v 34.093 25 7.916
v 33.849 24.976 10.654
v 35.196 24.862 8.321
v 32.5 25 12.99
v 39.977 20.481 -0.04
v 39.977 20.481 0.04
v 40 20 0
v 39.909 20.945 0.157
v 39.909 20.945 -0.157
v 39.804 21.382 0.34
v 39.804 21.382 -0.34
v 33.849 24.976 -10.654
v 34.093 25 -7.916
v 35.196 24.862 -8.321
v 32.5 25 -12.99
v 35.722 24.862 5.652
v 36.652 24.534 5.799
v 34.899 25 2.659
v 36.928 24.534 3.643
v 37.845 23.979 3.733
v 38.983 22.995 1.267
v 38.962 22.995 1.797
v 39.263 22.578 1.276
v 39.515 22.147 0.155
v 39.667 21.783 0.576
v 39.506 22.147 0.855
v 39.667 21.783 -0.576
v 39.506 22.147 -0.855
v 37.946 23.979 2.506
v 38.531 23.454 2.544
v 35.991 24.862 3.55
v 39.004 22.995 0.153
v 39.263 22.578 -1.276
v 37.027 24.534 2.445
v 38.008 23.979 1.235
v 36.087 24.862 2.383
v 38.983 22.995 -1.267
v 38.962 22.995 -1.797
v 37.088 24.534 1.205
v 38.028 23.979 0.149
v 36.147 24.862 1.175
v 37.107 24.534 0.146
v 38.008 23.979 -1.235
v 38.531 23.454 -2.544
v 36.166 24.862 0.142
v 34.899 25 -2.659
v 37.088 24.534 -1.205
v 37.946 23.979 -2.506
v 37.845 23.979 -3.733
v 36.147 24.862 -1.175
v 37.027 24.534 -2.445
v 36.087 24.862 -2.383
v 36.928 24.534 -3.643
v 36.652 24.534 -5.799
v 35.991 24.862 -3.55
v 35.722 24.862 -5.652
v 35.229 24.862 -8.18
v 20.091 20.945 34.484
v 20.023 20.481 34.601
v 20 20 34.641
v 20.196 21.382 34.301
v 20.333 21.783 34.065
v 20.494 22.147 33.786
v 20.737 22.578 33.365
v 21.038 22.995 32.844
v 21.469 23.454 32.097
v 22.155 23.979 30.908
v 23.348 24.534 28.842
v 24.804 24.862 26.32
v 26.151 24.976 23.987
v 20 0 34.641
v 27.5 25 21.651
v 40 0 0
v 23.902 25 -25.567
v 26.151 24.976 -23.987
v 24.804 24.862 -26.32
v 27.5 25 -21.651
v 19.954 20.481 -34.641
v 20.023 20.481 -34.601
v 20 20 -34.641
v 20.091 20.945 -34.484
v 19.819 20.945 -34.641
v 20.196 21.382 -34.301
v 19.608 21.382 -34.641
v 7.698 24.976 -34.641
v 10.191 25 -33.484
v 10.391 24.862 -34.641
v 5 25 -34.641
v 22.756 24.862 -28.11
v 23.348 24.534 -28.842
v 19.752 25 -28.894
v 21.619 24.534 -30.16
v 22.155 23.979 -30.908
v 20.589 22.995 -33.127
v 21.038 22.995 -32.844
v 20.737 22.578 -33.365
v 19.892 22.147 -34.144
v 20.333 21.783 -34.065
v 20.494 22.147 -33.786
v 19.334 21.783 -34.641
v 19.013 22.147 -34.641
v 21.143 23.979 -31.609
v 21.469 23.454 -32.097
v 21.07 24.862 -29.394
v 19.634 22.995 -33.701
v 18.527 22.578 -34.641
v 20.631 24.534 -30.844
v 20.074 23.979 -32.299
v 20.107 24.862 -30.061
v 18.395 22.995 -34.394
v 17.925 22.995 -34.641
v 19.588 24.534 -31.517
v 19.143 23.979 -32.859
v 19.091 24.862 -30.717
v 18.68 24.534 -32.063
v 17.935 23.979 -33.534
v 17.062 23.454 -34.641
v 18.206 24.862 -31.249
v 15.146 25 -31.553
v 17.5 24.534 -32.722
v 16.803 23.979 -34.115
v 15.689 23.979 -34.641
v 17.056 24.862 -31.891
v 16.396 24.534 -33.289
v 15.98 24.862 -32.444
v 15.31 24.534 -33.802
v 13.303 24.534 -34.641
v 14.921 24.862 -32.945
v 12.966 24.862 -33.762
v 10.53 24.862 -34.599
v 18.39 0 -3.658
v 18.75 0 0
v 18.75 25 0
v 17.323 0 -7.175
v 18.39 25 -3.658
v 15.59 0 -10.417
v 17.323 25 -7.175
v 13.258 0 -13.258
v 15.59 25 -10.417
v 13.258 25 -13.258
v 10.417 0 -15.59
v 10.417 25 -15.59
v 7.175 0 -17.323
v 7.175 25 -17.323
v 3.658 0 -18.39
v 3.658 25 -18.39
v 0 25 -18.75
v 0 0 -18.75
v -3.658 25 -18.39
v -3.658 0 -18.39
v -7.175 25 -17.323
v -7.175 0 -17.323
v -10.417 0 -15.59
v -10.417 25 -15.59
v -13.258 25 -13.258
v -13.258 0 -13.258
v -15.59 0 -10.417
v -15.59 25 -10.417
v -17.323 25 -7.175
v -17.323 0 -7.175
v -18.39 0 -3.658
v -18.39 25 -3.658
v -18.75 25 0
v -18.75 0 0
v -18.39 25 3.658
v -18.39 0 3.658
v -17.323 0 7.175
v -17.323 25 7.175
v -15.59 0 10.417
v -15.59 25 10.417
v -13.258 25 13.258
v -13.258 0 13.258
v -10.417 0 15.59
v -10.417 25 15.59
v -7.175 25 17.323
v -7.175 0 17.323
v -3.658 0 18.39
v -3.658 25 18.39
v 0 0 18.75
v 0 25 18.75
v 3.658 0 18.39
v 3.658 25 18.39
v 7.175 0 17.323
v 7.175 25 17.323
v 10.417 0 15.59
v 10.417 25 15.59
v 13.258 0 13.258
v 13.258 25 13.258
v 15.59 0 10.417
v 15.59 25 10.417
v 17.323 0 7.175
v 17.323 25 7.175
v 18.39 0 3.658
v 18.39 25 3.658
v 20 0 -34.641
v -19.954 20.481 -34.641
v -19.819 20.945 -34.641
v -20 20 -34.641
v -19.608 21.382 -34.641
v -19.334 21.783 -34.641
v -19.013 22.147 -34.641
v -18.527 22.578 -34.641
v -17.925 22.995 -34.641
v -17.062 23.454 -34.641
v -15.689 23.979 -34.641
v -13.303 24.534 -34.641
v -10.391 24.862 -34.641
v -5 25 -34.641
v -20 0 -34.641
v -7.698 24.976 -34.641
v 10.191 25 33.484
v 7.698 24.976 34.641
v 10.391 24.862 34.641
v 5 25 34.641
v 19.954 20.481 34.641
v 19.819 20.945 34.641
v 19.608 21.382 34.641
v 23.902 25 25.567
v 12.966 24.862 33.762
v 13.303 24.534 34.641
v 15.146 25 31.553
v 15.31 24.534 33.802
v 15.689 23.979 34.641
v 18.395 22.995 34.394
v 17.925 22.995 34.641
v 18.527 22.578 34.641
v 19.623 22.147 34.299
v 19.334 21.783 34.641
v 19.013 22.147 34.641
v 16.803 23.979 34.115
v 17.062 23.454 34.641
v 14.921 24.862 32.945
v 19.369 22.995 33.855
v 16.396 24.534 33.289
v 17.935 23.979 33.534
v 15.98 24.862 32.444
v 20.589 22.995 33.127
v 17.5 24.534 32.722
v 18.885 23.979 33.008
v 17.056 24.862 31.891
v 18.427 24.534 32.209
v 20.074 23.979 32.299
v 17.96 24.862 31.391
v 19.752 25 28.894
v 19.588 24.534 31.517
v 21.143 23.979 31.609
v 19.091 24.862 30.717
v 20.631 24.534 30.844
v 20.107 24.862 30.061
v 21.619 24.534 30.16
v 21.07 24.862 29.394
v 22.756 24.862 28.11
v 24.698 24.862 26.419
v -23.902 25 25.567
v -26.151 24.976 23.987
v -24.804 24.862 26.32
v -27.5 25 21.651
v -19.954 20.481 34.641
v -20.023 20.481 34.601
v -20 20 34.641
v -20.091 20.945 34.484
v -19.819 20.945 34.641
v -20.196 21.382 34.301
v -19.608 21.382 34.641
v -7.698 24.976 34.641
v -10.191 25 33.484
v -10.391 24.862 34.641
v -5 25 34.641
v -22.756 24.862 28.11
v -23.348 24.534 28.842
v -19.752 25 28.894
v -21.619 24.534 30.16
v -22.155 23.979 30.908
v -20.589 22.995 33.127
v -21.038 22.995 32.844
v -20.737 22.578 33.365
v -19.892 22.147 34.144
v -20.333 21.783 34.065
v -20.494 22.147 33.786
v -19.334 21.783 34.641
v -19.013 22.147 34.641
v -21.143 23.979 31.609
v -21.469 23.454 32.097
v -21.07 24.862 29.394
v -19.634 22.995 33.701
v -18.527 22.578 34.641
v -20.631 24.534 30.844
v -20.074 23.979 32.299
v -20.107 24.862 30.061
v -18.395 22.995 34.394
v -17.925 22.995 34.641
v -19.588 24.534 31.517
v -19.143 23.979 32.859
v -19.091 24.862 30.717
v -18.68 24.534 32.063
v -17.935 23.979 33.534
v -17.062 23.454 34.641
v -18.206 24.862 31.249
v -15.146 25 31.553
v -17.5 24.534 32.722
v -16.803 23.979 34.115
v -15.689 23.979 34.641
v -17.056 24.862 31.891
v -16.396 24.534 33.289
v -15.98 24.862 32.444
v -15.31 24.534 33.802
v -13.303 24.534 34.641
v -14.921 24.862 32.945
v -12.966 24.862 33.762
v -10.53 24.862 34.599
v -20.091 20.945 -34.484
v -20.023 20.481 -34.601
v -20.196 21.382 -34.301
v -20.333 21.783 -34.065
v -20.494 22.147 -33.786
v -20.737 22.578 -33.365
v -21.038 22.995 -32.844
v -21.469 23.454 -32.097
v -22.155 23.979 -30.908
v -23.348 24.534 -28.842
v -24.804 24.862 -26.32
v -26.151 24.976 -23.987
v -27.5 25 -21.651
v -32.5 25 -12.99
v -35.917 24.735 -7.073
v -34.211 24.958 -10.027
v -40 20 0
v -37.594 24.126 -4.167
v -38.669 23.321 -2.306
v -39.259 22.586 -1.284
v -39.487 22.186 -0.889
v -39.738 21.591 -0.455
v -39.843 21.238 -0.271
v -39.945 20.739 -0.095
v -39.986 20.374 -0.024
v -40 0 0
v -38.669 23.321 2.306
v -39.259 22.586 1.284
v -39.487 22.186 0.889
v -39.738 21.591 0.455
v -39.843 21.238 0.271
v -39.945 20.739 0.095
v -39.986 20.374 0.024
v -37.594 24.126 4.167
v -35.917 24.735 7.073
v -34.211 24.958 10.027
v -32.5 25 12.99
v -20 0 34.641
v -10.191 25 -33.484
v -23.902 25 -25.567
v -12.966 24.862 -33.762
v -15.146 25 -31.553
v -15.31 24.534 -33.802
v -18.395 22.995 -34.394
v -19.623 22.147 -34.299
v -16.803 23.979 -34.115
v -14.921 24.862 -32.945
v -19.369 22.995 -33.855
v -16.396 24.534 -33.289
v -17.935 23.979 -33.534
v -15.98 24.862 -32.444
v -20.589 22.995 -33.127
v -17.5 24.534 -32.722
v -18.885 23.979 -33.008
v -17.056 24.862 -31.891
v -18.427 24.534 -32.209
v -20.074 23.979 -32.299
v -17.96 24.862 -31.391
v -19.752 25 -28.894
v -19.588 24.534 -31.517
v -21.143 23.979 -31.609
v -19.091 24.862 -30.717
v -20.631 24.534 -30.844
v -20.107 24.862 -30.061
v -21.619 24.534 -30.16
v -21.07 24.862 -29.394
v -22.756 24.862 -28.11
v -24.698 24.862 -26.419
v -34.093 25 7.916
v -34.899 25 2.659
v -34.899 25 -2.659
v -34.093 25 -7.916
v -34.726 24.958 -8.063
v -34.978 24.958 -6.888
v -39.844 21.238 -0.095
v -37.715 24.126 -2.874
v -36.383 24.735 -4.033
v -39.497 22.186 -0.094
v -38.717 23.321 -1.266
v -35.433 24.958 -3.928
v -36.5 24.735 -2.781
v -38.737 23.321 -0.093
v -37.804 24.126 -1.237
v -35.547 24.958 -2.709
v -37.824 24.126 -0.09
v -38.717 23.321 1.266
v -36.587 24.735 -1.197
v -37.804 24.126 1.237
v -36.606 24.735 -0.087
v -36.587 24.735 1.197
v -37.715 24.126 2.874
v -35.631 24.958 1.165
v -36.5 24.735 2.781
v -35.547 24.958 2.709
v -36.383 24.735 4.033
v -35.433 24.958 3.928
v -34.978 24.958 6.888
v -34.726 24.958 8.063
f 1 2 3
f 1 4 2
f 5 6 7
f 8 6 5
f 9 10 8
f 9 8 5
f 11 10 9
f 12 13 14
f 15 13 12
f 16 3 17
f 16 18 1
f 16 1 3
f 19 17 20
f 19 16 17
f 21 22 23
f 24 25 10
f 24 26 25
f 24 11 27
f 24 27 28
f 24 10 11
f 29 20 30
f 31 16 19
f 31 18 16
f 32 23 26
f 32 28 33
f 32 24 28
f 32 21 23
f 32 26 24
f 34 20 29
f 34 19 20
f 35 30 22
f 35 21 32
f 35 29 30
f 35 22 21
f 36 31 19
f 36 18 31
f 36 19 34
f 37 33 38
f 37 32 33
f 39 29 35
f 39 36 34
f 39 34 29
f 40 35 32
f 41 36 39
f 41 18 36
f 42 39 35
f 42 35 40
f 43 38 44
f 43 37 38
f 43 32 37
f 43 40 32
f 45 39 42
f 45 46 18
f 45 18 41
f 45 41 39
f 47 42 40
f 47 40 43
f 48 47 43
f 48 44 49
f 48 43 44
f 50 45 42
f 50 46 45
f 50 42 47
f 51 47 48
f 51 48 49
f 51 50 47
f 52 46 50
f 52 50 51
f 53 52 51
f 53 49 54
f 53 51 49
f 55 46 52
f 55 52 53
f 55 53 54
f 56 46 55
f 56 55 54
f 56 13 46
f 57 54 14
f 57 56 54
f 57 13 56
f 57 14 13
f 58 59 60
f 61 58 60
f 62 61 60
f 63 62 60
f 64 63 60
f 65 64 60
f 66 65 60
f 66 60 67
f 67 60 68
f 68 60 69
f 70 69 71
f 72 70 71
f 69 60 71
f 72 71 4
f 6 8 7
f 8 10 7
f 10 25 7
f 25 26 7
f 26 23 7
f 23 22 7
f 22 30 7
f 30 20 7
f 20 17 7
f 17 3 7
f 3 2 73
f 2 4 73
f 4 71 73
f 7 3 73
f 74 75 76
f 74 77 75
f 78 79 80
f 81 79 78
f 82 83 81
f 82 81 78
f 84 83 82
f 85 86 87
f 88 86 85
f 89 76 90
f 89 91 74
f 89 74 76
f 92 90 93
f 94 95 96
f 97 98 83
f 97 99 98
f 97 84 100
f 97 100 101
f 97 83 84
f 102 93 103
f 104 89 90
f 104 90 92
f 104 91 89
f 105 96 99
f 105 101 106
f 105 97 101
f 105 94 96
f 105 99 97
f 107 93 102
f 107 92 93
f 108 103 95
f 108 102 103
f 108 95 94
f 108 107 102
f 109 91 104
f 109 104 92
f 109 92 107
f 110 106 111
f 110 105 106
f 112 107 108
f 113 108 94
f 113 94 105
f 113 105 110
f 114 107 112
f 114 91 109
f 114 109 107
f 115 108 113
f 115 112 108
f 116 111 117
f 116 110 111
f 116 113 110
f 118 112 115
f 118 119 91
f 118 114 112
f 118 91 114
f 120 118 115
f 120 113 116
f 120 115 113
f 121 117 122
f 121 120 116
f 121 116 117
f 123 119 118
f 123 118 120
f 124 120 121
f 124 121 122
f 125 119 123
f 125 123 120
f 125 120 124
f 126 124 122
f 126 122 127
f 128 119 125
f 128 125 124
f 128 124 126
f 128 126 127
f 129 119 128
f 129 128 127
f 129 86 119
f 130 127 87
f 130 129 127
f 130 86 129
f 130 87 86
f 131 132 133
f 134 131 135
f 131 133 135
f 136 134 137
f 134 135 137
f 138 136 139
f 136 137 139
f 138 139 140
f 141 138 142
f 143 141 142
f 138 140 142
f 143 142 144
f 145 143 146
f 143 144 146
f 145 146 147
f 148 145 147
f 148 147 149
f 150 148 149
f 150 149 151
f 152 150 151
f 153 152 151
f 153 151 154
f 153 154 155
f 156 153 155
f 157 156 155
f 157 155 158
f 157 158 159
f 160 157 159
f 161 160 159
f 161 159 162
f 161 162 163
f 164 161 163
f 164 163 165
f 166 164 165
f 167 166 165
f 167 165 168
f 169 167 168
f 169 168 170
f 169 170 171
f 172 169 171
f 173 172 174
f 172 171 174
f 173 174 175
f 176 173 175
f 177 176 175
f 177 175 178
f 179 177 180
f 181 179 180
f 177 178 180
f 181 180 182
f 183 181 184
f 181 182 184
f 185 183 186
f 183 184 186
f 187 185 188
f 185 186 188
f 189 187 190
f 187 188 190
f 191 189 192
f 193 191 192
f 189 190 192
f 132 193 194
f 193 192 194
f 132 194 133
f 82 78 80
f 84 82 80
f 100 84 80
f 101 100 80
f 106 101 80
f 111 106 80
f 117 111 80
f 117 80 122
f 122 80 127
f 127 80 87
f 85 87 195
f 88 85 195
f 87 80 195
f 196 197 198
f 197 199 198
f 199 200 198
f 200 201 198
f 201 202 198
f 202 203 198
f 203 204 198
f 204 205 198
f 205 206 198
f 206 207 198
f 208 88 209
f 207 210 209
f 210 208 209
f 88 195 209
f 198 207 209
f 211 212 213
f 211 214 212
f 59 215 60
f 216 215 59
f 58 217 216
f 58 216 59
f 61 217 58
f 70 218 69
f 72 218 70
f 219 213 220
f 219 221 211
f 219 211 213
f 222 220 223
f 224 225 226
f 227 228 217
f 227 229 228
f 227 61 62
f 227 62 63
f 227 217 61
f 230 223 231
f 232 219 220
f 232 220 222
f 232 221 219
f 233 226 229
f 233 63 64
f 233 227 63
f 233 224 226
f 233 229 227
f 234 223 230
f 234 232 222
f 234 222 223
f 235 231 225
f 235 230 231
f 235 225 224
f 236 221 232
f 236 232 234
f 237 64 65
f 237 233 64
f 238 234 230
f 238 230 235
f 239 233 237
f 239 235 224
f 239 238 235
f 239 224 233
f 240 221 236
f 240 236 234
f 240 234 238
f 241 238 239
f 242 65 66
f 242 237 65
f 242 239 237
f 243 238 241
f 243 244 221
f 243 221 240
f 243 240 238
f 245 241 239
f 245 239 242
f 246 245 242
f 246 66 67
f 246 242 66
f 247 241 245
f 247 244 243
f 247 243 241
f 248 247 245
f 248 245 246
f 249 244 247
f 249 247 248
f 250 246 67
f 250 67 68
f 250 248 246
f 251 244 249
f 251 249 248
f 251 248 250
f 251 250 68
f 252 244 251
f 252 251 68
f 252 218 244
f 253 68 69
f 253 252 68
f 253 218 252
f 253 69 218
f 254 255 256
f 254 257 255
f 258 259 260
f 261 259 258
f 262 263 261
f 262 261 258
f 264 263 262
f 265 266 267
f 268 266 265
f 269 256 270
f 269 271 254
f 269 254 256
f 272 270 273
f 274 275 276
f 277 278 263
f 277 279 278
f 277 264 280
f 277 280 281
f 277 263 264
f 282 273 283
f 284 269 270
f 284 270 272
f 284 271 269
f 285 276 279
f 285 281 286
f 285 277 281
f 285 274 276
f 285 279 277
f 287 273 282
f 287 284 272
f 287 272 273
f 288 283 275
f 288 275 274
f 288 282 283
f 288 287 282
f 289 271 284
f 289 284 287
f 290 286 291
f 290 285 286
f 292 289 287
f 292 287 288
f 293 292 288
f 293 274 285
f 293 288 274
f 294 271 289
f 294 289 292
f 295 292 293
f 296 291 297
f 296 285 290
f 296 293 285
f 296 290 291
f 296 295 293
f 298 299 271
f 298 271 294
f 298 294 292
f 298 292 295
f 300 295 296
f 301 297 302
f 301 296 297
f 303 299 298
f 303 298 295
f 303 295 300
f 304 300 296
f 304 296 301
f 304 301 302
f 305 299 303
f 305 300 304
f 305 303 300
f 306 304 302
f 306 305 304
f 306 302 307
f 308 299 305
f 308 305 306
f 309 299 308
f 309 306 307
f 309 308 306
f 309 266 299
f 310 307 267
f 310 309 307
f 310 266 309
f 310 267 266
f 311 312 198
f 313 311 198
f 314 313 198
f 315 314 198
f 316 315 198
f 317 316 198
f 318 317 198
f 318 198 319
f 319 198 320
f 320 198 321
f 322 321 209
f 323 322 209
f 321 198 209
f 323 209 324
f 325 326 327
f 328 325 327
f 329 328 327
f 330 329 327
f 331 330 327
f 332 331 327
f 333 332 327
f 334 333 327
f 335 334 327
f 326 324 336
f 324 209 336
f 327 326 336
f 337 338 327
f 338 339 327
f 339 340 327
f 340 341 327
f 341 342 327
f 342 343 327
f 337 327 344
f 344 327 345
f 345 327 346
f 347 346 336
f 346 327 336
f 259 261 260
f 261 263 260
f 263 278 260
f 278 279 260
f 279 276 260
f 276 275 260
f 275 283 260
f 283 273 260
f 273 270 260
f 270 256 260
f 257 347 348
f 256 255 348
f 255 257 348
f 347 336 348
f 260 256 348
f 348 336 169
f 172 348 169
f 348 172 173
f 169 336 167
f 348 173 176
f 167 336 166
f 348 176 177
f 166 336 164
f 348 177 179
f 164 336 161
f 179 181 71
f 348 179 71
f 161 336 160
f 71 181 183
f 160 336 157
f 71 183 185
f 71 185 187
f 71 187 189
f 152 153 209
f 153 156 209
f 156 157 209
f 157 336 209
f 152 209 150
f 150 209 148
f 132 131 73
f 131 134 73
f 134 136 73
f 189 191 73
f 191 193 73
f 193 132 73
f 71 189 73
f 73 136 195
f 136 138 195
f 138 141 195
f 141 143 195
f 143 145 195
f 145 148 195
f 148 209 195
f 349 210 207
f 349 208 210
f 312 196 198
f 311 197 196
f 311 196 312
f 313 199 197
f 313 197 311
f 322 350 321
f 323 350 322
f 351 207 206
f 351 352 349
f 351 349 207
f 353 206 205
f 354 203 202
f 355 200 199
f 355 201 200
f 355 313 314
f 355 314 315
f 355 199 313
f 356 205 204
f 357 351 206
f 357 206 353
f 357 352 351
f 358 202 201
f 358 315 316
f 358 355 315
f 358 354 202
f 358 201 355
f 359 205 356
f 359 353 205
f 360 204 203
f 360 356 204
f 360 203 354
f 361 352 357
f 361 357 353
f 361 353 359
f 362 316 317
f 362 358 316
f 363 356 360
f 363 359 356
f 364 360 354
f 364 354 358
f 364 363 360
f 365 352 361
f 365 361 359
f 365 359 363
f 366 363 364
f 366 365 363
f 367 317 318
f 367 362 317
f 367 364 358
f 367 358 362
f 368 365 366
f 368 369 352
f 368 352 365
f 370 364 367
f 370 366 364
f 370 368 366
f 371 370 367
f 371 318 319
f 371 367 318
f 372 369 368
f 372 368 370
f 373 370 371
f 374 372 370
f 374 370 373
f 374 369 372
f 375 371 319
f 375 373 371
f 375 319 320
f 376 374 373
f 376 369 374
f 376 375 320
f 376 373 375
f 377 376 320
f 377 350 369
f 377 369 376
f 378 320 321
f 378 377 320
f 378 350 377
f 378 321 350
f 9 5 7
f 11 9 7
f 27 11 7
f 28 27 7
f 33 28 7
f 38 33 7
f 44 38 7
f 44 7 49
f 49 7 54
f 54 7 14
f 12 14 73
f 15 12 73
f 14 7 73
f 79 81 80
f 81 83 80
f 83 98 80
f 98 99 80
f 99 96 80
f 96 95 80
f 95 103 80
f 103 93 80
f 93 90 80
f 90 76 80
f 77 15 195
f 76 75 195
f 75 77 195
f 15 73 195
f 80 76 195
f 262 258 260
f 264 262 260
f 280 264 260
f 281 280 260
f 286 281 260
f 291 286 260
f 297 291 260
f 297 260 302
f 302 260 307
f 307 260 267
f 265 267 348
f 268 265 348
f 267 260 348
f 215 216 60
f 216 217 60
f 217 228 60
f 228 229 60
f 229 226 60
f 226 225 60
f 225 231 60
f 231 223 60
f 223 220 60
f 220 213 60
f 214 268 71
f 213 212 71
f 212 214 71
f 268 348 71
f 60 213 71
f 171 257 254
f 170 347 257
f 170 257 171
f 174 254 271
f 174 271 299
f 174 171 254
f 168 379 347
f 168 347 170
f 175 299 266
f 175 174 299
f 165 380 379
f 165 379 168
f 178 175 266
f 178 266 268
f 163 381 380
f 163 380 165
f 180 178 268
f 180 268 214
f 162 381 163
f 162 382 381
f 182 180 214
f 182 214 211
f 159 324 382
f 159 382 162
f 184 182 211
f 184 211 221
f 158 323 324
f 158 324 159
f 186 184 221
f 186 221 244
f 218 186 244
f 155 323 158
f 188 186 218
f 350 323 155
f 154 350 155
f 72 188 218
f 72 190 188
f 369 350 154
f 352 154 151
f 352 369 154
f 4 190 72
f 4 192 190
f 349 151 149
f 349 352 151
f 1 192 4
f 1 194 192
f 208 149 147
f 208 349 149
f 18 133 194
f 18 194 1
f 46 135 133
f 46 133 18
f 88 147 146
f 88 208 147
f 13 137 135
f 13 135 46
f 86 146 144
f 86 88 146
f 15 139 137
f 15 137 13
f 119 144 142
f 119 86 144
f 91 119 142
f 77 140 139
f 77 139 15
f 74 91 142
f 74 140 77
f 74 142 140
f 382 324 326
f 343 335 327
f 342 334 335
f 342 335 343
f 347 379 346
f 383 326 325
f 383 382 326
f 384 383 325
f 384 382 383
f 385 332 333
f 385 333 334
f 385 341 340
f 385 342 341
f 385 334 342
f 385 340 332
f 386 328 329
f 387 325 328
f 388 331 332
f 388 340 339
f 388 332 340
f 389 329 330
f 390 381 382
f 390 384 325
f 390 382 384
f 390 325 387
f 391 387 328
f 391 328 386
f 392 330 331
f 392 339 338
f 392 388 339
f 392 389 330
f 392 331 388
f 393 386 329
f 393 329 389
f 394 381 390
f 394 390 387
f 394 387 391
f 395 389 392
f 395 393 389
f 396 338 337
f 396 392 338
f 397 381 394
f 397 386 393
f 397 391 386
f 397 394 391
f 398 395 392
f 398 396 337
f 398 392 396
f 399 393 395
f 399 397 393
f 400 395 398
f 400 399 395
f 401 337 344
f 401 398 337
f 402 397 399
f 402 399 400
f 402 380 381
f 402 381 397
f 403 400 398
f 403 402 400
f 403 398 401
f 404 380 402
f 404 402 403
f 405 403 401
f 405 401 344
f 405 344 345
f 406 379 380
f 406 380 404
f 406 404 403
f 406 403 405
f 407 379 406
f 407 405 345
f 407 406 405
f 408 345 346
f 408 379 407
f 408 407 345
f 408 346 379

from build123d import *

# Parameters (mm, degrees)
BOSS_EXTRUDE1_DEPTH = 25
SKETCH3_R           = 18.75
CUT_EXTRUDE1_DEPTH  = 49


with BuildPart() as part:
    # Sketch1 → Boss-Extrude1 (new body)
    with BuildSketch(Plane(origin=(0, 0, 0), x_dir=(1, 0, 0), z_dir=(0, 1, 0))):
        Polygon((40, 0), (20, 34.641016151), (-20, 34.641016151), (-40, 0), (-20, -34.641016151), (20, -34.641016151), align=None)
    extrude(amount=BOSS_EXTRUDE1_DEPTH)

    # Sketch2 → Cut-Revolve1 (revolve, cut)
    with BuildSketch(Plane.XY):
        with BuildLine():
            Line((-40, 19.787670443), (-40, 20))
            ThreePointArc((-40, 20), (-38.535533906, 23.535533906), (-35, 25))
            Line((-35, 25), (-37.757743641, 31.268029575))
            Line((-37.757743641, 31.268029575), (-44.972742857, 23.763902868))
            Line((-44.972742857, 23.763902868), (-40, 19.787670443))
        make_face()
    revolve(axis=Axis((0, 25, 0), (0, 1, 0)), mode=Mode.SUBTRACT)

    # Sketch3 → Cut-Extrude1 (cut)
    with BuildSketch(Plane(origin=(0, 25, 0), x_dir=(1, 0, 0), z_dir=(0, 1, 0))):
        Circle(SKETCH3_R)
    extrude(amount=-CUT_EXTRUDE1_DEPTH, mode=Mode.SUBTRACT)


solid = part.part
